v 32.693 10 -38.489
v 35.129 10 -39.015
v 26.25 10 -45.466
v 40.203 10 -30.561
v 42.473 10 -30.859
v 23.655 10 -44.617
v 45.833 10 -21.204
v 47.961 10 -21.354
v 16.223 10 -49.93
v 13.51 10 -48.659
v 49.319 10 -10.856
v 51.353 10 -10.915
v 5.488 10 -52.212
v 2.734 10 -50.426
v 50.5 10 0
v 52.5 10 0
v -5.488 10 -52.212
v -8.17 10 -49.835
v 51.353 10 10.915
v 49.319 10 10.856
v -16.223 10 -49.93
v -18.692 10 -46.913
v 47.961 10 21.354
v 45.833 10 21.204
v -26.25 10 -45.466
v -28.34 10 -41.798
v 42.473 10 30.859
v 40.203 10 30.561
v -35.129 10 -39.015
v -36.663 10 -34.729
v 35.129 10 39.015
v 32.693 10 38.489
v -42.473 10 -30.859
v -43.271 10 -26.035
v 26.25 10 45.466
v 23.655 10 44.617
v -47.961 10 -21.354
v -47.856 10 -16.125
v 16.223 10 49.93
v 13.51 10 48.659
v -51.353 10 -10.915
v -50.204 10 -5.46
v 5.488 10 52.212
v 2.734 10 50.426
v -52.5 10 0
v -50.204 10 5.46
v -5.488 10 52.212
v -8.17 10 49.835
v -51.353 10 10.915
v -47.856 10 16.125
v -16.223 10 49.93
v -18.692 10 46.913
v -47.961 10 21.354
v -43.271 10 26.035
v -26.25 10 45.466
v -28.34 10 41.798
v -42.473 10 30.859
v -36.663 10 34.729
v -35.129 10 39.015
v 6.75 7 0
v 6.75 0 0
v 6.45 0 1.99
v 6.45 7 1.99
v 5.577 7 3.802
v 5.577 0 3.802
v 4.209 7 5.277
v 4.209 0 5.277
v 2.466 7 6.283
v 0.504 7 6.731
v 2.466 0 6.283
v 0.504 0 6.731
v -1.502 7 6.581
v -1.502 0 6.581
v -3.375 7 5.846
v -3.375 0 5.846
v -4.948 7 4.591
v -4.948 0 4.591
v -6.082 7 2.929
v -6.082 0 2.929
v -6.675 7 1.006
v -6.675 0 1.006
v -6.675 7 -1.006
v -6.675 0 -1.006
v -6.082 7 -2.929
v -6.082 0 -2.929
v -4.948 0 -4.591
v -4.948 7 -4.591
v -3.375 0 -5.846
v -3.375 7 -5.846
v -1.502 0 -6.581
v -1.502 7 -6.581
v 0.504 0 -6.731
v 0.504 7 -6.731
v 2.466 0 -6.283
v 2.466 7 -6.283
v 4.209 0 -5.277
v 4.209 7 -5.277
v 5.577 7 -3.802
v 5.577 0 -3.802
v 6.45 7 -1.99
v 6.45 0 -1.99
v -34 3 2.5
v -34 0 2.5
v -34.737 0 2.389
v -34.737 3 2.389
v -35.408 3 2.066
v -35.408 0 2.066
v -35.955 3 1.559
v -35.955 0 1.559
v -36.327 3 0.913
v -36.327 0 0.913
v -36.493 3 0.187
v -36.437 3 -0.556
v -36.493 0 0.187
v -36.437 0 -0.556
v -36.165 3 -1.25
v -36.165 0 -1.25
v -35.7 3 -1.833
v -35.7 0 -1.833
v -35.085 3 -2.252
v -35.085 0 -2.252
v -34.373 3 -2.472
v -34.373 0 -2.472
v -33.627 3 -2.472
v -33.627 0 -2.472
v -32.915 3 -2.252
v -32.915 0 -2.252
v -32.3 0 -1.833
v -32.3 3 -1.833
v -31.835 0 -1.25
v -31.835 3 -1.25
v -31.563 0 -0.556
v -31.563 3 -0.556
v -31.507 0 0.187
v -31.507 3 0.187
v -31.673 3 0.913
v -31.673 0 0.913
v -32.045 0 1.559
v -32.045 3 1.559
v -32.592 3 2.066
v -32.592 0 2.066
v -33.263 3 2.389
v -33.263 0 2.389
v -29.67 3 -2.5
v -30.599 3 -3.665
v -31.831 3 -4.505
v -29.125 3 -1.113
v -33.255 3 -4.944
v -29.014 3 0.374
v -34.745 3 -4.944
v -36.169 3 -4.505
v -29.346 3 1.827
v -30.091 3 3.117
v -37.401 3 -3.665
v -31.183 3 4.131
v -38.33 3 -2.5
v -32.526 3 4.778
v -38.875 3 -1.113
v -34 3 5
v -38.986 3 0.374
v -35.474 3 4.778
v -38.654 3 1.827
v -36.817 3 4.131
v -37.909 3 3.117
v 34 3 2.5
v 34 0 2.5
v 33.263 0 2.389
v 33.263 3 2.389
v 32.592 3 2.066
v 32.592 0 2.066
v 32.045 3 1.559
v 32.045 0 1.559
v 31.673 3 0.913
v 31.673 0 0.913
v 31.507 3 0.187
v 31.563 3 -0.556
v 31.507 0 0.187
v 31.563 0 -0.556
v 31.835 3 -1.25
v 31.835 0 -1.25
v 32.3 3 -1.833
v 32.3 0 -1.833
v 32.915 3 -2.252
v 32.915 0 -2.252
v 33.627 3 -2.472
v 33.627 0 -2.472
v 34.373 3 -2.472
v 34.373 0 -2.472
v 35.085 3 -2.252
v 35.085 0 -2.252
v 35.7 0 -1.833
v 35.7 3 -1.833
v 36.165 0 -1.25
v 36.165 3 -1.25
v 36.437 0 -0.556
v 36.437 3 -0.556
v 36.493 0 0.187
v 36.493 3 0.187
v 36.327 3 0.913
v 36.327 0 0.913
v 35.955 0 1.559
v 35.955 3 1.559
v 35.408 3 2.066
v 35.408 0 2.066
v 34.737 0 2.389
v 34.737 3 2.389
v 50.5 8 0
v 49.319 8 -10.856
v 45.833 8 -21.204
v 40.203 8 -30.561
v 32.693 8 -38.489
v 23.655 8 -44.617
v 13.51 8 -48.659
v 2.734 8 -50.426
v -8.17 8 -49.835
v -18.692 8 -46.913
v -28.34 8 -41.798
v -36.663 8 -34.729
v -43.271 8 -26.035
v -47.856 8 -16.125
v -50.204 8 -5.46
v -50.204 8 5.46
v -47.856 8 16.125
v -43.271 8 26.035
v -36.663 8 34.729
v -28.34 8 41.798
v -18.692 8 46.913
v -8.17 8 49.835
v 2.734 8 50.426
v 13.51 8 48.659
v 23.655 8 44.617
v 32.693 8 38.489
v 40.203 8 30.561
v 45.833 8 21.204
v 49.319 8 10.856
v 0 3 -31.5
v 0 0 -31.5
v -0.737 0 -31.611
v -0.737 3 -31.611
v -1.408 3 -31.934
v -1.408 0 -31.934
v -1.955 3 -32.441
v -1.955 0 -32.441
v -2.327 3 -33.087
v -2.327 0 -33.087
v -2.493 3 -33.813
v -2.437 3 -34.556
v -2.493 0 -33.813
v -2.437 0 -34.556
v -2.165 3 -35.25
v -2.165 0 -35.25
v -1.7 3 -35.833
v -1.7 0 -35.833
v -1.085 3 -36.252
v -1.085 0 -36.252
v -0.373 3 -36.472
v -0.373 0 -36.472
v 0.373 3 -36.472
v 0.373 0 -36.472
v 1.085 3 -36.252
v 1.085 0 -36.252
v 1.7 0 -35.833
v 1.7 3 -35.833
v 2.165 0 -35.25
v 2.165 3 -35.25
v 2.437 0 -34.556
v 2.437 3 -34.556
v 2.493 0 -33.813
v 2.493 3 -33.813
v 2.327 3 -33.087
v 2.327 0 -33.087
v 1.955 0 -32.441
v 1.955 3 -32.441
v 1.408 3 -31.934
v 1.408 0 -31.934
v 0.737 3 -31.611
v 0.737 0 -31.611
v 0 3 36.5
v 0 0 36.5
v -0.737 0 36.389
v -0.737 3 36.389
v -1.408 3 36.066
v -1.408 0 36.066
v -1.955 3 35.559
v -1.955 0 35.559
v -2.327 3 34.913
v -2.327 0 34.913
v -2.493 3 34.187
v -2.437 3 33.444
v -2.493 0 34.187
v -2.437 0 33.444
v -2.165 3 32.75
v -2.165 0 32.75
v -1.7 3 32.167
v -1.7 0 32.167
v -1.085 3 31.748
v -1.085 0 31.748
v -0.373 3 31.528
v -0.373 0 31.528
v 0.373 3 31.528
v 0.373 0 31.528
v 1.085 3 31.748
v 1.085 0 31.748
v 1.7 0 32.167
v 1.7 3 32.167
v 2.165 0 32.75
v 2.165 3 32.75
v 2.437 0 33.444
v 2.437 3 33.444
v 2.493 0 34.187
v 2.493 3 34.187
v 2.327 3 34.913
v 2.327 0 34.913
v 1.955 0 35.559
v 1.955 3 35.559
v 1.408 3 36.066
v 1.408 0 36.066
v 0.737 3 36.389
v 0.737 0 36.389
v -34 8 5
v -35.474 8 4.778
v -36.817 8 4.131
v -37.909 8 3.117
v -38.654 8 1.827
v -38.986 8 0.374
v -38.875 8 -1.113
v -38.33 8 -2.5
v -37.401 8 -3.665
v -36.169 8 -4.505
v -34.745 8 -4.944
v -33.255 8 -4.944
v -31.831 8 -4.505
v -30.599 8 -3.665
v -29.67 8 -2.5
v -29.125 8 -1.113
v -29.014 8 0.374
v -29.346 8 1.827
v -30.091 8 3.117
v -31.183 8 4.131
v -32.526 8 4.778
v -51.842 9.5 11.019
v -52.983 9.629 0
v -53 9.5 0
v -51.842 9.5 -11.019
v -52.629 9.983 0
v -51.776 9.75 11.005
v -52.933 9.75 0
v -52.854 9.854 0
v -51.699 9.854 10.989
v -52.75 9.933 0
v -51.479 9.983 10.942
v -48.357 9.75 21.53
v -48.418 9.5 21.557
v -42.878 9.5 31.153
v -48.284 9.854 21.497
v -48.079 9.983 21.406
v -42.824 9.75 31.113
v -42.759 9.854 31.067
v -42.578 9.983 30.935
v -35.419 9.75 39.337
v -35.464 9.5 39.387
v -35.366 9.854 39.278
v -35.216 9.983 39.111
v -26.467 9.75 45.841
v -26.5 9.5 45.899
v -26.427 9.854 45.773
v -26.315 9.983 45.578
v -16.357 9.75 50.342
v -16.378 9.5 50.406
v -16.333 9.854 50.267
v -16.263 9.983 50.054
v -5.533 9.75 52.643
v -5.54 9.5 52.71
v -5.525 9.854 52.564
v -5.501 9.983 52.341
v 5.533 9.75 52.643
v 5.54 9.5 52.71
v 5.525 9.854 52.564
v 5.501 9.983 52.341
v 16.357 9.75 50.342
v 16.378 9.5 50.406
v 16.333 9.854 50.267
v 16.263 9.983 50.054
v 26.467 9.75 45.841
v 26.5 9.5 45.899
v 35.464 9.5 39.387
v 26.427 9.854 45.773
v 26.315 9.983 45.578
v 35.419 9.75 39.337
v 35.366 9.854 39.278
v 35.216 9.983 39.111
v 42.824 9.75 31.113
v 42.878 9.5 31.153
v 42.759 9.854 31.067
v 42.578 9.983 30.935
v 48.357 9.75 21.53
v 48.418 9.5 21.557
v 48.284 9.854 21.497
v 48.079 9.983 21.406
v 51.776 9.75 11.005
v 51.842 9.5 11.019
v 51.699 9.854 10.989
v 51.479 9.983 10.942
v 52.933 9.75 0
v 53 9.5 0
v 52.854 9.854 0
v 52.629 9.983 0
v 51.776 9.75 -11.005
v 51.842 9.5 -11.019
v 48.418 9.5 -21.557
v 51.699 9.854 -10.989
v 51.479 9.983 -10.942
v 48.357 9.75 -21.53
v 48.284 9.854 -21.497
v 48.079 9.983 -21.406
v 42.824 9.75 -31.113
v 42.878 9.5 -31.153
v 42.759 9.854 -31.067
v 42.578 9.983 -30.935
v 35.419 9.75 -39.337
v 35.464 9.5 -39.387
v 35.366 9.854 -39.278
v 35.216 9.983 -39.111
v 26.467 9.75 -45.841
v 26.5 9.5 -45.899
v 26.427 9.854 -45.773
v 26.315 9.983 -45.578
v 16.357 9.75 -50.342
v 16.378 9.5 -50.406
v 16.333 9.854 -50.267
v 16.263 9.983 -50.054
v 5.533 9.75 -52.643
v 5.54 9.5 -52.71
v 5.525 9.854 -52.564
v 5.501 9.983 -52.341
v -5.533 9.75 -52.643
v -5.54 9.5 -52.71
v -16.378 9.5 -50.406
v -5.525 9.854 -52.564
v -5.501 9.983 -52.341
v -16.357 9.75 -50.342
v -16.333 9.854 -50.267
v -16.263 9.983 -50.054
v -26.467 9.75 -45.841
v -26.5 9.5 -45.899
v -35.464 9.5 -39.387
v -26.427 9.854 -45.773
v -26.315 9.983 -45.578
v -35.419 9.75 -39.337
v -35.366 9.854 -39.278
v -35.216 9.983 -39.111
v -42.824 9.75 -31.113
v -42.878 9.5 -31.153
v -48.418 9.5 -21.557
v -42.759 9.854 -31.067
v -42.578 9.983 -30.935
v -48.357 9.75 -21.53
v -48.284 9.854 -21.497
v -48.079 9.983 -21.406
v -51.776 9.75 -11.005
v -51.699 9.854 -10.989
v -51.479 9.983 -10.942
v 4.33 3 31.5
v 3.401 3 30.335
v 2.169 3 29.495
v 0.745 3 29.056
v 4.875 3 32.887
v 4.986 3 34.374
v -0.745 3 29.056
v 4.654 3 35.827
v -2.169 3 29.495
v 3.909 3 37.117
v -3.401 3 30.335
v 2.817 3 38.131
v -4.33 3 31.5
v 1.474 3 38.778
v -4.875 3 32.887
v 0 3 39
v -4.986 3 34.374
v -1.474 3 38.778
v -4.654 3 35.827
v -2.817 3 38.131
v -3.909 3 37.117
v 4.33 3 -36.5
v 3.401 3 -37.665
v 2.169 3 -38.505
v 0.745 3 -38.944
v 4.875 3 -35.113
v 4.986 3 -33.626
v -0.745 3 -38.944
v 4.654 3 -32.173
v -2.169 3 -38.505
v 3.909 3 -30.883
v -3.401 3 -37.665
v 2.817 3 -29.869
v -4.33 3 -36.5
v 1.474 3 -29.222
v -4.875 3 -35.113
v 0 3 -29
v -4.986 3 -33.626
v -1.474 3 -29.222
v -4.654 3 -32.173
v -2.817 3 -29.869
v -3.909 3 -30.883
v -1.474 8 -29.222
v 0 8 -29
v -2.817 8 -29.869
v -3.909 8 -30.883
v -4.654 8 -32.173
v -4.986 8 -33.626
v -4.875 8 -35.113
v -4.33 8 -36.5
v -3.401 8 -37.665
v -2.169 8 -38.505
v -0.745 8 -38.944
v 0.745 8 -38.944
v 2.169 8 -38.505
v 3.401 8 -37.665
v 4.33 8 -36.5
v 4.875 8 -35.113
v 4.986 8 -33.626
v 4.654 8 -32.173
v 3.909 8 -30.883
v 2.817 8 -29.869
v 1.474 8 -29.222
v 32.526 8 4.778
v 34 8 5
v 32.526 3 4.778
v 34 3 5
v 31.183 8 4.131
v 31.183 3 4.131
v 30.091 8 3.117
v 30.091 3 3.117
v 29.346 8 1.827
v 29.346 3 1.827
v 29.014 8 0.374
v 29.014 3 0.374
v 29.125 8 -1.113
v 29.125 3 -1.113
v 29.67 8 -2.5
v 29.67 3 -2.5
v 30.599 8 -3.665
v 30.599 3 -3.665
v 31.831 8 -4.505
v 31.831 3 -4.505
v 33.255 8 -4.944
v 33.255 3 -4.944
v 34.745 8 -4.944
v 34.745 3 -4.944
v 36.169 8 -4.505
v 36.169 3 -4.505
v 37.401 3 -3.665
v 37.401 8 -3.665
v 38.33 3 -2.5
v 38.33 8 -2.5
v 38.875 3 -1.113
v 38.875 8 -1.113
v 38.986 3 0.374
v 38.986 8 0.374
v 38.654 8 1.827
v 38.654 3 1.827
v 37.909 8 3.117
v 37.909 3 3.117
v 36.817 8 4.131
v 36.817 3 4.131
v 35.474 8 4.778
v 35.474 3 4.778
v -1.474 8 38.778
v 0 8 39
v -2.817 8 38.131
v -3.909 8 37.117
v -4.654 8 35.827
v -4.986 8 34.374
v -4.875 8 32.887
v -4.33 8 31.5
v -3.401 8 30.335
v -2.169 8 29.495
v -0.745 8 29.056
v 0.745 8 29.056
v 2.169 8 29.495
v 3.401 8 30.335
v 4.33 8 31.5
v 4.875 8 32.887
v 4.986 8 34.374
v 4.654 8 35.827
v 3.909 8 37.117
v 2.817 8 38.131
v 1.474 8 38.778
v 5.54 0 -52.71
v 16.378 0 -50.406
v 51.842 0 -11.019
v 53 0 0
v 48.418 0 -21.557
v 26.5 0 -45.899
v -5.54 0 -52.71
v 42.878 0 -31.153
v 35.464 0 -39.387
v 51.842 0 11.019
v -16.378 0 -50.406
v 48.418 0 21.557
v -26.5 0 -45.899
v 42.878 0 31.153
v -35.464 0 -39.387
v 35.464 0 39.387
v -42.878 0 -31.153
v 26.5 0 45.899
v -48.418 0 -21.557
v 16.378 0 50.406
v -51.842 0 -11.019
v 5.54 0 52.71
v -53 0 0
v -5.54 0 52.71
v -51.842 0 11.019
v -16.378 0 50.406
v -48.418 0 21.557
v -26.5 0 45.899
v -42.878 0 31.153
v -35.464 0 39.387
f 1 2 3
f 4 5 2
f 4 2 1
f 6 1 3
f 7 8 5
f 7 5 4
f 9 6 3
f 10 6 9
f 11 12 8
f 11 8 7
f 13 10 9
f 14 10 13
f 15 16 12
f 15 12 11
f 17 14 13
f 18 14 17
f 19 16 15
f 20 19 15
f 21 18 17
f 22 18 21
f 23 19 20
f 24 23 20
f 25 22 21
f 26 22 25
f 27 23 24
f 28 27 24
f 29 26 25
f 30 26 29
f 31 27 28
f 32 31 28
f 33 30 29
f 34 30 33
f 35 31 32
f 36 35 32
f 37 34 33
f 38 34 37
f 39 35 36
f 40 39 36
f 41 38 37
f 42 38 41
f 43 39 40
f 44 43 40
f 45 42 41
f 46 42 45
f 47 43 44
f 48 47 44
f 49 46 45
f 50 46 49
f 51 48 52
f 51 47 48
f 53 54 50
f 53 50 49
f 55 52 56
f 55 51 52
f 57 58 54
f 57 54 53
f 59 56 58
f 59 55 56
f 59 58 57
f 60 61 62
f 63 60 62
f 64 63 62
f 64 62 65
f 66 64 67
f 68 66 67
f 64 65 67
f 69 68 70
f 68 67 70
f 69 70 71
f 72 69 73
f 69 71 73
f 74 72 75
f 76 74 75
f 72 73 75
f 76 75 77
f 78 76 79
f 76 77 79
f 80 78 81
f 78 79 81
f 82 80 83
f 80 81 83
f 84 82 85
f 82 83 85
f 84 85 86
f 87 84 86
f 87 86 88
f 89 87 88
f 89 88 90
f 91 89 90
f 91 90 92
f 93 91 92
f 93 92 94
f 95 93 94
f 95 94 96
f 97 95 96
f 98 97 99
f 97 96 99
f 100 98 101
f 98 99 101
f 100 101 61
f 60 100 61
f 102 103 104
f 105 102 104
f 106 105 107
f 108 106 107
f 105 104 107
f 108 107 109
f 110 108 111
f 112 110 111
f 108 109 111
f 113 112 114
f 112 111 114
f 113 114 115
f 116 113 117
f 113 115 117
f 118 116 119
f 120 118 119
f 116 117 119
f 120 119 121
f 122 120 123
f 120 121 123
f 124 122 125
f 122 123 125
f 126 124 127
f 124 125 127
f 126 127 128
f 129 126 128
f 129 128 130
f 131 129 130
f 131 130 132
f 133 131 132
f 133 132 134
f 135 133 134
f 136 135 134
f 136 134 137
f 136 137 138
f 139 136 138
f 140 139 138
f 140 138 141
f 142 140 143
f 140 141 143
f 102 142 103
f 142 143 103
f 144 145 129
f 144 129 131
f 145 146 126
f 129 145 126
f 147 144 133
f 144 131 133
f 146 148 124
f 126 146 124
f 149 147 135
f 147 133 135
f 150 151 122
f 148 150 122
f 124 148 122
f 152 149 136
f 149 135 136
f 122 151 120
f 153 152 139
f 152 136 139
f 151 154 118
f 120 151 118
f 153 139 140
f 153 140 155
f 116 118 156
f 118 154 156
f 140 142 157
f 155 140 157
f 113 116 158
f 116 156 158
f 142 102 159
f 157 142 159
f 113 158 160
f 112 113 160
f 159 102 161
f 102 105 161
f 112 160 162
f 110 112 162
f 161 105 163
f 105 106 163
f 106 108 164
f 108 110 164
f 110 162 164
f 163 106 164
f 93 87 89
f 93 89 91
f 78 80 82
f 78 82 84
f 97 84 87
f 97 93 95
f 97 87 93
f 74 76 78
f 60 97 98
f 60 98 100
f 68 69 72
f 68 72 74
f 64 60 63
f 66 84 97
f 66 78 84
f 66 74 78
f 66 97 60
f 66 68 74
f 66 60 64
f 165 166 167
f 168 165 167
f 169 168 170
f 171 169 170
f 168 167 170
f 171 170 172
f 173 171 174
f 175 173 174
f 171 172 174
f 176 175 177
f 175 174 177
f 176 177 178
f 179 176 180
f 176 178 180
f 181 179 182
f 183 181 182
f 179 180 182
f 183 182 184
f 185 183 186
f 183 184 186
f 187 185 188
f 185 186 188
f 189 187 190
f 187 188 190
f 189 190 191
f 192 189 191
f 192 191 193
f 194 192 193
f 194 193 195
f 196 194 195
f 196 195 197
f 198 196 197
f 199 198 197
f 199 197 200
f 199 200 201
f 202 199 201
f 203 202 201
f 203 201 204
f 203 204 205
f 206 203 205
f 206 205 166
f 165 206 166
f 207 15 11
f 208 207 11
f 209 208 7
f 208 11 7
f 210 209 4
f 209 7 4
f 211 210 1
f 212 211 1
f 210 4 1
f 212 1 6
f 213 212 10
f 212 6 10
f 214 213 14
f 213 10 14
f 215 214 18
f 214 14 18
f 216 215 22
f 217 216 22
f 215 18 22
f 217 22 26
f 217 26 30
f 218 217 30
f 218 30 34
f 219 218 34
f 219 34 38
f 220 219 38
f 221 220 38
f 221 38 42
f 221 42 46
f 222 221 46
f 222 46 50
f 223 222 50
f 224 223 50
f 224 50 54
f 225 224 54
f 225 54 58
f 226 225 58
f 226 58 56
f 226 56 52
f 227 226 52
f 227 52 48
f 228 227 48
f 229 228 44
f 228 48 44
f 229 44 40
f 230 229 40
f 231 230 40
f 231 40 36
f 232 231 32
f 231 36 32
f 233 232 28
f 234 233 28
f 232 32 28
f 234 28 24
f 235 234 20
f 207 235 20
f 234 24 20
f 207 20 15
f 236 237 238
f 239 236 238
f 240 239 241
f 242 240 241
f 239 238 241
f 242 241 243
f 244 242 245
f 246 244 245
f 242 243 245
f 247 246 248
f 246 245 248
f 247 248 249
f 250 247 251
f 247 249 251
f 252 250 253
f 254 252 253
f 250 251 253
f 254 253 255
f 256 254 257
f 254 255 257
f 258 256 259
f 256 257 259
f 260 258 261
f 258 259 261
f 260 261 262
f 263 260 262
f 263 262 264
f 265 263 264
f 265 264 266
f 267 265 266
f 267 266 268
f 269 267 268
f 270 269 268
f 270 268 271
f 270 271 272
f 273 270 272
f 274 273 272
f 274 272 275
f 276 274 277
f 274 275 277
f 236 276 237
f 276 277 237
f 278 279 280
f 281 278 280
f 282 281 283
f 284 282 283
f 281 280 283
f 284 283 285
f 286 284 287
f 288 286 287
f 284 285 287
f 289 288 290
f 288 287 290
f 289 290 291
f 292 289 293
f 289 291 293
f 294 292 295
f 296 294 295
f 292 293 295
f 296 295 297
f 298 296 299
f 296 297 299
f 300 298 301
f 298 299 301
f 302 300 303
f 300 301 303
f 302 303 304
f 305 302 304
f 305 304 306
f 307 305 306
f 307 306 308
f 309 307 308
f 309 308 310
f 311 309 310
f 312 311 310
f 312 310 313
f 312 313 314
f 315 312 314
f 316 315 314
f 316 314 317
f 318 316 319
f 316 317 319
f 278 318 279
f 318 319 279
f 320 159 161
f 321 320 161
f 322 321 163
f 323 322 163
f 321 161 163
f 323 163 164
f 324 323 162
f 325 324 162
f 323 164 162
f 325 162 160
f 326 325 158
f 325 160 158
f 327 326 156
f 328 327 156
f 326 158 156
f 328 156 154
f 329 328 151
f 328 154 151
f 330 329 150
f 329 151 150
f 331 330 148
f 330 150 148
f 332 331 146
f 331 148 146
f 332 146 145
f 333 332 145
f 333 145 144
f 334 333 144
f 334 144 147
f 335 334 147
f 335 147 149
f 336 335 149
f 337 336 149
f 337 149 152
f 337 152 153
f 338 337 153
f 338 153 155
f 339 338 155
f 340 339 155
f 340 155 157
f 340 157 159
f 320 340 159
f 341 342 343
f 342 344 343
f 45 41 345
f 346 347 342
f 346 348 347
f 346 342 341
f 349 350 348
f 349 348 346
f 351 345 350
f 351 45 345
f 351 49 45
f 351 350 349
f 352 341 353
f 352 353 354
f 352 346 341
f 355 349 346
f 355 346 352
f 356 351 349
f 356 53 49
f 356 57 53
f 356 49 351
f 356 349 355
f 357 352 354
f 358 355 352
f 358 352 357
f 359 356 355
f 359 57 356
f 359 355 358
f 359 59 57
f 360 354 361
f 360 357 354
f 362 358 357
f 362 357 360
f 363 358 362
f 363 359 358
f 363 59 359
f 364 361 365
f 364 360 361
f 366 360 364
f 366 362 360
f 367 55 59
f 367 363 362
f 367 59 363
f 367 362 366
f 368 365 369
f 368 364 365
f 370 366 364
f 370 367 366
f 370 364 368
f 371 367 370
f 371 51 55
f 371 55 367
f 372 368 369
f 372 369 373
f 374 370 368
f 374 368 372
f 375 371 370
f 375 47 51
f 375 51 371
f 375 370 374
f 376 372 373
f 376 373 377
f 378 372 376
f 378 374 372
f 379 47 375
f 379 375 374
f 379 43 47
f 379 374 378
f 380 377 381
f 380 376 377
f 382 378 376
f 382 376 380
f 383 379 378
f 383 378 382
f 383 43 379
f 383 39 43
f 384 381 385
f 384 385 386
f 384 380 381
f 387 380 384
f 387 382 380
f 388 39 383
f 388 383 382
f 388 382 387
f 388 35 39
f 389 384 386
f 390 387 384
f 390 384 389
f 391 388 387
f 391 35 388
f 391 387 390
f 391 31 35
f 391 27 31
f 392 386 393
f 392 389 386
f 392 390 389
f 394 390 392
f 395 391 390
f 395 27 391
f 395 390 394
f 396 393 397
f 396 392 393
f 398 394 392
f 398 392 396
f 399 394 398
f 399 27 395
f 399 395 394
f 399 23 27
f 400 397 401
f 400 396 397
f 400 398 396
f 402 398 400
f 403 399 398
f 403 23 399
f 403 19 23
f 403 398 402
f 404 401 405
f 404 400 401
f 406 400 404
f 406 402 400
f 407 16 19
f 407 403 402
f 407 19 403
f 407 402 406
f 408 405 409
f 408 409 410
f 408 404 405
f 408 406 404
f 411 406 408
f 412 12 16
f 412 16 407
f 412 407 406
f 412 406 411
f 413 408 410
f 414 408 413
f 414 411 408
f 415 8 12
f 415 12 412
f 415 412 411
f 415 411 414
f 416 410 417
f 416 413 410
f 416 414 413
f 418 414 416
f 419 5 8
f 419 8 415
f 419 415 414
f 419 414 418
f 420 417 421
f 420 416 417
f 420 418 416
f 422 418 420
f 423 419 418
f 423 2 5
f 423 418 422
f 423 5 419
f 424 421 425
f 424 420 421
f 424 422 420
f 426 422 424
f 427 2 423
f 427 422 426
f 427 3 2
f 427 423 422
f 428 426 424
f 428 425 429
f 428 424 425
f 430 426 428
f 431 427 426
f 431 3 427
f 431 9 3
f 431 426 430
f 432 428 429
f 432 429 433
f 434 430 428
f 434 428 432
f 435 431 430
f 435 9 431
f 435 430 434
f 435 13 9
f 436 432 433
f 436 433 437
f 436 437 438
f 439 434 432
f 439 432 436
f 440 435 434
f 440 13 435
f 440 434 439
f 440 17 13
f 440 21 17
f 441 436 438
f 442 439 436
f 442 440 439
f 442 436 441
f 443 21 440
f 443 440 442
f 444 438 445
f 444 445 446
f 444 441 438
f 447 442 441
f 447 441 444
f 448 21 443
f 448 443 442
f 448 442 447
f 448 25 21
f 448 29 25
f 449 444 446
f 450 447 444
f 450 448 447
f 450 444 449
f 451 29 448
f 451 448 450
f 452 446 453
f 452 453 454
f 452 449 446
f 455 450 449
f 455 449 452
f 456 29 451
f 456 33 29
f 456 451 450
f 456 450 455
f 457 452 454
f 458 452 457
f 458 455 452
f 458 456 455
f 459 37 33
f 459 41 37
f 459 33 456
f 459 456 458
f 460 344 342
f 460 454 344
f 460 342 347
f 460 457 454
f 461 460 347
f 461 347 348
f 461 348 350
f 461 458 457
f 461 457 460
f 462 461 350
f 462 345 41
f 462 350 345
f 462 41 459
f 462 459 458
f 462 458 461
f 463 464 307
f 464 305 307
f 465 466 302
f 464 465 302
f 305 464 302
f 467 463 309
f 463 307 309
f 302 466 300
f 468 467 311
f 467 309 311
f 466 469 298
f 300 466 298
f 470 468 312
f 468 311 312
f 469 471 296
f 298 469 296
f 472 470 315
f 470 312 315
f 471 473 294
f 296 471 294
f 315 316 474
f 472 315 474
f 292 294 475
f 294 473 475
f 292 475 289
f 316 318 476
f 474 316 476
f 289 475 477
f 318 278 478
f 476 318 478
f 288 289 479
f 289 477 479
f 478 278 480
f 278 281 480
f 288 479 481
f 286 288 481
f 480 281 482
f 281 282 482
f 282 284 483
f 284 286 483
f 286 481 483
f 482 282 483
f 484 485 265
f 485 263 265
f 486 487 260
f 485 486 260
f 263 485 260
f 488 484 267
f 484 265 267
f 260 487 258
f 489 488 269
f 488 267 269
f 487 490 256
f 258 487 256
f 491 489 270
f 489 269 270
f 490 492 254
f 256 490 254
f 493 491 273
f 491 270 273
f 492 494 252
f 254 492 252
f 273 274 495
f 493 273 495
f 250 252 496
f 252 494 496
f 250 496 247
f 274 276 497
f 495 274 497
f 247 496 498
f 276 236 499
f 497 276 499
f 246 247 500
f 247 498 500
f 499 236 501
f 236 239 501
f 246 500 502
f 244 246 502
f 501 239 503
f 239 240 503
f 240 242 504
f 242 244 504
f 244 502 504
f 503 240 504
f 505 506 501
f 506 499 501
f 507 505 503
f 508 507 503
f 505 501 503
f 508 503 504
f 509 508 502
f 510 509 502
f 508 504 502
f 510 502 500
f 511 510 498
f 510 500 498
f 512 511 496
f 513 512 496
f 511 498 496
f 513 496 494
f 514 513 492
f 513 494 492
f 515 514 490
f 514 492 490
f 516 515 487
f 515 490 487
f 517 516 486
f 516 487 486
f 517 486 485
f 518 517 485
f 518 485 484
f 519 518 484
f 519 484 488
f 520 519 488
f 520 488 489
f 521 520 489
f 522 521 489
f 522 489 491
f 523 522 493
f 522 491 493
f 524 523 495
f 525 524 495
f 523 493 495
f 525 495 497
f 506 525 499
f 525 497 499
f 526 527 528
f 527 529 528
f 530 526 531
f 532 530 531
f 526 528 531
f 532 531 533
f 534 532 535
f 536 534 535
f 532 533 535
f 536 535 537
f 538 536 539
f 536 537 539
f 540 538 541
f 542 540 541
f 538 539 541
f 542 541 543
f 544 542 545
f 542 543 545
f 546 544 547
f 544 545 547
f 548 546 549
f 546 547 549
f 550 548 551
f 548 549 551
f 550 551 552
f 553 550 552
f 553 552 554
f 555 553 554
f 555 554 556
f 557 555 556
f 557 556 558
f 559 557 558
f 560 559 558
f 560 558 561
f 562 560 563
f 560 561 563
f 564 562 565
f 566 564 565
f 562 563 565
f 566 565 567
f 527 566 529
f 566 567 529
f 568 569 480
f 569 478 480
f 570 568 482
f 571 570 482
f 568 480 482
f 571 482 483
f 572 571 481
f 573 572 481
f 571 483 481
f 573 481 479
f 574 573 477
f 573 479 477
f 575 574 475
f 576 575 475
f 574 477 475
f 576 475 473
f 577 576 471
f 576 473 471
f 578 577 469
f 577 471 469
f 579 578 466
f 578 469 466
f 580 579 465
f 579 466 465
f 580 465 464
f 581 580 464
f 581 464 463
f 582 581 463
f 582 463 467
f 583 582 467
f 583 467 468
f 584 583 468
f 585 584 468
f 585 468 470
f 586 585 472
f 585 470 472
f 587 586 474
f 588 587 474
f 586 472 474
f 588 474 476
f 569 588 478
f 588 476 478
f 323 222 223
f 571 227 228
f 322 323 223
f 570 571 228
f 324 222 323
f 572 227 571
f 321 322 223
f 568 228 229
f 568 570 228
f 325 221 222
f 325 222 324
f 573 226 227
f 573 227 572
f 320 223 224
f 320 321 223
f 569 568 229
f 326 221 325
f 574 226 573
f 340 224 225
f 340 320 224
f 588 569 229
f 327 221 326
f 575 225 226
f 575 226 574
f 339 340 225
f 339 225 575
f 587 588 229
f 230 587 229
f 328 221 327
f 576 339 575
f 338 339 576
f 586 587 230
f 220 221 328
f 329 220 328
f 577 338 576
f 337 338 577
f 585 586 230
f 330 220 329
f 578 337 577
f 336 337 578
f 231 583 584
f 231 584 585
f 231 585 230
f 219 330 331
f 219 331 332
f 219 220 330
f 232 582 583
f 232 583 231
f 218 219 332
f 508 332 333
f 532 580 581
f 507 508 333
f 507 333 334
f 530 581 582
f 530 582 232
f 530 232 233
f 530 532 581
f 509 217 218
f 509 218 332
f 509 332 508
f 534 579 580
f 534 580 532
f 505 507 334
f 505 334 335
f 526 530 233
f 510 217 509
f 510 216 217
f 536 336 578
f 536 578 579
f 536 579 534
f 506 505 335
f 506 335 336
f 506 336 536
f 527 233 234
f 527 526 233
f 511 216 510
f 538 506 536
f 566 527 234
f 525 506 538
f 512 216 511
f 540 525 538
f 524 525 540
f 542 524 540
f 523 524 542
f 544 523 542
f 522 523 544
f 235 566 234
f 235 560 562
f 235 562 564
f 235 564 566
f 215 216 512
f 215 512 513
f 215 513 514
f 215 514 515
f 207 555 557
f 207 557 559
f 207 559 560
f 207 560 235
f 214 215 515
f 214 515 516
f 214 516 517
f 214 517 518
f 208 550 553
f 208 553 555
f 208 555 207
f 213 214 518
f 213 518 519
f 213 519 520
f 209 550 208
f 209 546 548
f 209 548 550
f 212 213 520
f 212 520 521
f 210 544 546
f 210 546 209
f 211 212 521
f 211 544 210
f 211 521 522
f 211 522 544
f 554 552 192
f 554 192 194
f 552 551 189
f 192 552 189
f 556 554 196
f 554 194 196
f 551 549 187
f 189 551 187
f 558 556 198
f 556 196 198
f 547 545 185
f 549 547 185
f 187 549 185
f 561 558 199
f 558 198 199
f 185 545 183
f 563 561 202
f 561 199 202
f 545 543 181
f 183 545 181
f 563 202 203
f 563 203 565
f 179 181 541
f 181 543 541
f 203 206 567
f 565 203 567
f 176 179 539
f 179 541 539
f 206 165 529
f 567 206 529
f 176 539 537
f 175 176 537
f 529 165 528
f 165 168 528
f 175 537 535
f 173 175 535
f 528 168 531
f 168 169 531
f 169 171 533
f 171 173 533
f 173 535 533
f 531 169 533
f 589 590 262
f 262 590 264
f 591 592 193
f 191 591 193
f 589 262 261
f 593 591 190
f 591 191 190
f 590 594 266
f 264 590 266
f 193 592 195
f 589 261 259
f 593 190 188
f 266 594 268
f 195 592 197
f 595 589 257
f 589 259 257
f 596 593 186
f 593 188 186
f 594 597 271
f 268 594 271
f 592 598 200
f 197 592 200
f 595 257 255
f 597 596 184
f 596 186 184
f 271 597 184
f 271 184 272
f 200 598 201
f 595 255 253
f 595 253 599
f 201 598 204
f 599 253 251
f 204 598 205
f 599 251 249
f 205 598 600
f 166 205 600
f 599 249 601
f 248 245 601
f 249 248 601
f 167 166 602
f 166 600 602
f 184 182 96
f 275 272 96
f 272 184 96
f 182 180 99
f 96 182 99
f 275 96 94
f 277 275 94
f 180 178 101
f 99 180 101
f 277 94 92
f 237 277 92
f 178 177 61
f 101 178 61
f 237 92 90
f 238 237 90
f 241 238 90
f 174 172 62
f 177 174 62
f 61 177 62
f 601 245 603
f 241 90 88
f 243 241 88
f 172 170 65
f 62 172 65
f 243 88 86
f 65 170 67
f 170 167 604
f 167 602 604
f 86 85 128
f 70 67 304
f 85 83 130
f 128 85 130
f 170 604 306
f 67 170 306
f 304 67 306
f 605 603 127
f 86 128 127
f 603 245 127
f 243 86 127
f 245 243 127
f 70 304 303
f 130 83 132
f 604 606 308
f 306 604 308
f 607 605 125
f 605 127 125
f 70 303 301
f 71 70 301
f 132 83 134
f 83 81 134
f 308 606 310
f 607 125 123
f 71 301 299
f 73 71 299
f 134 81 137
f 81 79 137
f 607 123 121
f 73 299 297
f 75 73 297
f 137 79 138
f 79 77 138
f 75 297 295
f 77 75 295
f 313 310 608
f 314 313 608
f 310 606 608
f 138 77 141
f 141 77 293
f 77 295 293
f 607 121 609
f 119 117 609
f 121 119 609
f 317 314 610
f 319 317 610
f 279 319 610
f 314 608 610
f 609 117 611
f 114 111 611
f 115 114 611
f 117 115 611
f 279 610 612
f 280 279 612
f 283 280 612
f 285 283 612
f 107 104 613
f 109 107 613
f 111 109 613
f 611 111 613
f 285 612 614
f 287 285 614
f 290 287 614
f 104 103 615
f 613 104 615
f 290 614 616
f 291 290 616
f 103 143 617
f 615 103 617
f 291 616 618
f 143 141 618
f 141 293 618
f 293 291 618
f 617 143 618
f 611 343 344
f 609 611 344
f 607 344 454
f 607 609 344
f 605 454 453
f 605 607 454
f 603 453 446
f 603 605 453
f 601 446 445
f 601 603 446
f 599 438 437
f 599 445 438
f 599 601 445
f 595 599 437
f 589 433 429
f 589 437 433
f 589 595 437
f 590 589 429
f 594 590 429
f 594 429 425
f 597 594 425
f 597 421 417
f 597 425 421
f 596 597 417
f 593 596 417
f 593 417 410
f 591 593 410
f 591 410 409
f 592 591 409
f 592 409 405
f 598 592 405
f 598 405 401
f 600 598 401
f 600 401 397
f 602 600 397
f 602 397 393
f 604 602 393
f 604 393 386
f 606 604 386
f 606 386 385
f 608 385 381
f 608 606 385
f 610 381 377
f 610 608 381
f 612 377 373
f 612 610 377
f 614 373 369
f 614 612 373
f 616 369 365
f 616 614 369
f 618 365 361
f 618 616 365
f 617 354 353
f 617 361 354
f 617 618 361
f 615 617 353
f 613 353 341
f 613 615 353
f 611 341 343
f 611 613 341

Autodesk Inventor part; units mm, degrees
ref_plane "YZ Plane" through (0, 0, 0) normal (1, 0, 0) x (0, 1, 0)
ref_plane "XZ Plane" through (0, 0, 0) normal (0, 1, 0) x (-1, 0, 0)
ref_plane "XY Plane" through (0, 0, 0) normal (0, 0, 1) x (1, 0, 0)
sketch "スケッチ1" plane through (0, 0, 0) normal (0, 1, 0) x (-1, 0, 0)
  circle A0 centre (0, 0) radius 53
  dimension "d0" = 106
extrude "押し出し1" add sketch "スケッチ1" along normal blind 10
sketch "スケッチ2" plane through (0, 10, 0) normal (0, 1, 0) x (1, 0, 0)
  circle A0 centre (0, 0) radius 50.5
  dimension "d3" = 101
extrude "押し出し2" cut sketch "スケッチ2" against normal blind 2
sketch "スケッチ3" plane through (0, 8, 0) normal (0, 1, 0) x (1, 0, 0)
  point P0 (0, 0)
  point P1 (34, 0)
  point P2 (0, 34)
  point P3 (-34, 0)
  point P4 (0, -34)
  dimension "d6" = 34
  dimension "d9" = 360
hole "穴2" at (-34, 8, 0) at (0, 8, -34) at (34, 8, 0) at (0, 8, 34) direction (0, -1, 0) diameter 5 end through all counterbore diameter 10 counterbore depth 5
fillet "フィレット1" radius 0.5 1 edges at (53, 10, 0)
sketch "スケッチ4" plane through (0, 0, 0) normal (0, -1, 0) x (1, 0, 0)
  circle A0 centre (0, 0) radius 6.75
  dimension "d26" = 13.5
extrude "押し出し3" cut sketch "スケッチ4" against normal blind 7
properties part number "GNSS_mount"
